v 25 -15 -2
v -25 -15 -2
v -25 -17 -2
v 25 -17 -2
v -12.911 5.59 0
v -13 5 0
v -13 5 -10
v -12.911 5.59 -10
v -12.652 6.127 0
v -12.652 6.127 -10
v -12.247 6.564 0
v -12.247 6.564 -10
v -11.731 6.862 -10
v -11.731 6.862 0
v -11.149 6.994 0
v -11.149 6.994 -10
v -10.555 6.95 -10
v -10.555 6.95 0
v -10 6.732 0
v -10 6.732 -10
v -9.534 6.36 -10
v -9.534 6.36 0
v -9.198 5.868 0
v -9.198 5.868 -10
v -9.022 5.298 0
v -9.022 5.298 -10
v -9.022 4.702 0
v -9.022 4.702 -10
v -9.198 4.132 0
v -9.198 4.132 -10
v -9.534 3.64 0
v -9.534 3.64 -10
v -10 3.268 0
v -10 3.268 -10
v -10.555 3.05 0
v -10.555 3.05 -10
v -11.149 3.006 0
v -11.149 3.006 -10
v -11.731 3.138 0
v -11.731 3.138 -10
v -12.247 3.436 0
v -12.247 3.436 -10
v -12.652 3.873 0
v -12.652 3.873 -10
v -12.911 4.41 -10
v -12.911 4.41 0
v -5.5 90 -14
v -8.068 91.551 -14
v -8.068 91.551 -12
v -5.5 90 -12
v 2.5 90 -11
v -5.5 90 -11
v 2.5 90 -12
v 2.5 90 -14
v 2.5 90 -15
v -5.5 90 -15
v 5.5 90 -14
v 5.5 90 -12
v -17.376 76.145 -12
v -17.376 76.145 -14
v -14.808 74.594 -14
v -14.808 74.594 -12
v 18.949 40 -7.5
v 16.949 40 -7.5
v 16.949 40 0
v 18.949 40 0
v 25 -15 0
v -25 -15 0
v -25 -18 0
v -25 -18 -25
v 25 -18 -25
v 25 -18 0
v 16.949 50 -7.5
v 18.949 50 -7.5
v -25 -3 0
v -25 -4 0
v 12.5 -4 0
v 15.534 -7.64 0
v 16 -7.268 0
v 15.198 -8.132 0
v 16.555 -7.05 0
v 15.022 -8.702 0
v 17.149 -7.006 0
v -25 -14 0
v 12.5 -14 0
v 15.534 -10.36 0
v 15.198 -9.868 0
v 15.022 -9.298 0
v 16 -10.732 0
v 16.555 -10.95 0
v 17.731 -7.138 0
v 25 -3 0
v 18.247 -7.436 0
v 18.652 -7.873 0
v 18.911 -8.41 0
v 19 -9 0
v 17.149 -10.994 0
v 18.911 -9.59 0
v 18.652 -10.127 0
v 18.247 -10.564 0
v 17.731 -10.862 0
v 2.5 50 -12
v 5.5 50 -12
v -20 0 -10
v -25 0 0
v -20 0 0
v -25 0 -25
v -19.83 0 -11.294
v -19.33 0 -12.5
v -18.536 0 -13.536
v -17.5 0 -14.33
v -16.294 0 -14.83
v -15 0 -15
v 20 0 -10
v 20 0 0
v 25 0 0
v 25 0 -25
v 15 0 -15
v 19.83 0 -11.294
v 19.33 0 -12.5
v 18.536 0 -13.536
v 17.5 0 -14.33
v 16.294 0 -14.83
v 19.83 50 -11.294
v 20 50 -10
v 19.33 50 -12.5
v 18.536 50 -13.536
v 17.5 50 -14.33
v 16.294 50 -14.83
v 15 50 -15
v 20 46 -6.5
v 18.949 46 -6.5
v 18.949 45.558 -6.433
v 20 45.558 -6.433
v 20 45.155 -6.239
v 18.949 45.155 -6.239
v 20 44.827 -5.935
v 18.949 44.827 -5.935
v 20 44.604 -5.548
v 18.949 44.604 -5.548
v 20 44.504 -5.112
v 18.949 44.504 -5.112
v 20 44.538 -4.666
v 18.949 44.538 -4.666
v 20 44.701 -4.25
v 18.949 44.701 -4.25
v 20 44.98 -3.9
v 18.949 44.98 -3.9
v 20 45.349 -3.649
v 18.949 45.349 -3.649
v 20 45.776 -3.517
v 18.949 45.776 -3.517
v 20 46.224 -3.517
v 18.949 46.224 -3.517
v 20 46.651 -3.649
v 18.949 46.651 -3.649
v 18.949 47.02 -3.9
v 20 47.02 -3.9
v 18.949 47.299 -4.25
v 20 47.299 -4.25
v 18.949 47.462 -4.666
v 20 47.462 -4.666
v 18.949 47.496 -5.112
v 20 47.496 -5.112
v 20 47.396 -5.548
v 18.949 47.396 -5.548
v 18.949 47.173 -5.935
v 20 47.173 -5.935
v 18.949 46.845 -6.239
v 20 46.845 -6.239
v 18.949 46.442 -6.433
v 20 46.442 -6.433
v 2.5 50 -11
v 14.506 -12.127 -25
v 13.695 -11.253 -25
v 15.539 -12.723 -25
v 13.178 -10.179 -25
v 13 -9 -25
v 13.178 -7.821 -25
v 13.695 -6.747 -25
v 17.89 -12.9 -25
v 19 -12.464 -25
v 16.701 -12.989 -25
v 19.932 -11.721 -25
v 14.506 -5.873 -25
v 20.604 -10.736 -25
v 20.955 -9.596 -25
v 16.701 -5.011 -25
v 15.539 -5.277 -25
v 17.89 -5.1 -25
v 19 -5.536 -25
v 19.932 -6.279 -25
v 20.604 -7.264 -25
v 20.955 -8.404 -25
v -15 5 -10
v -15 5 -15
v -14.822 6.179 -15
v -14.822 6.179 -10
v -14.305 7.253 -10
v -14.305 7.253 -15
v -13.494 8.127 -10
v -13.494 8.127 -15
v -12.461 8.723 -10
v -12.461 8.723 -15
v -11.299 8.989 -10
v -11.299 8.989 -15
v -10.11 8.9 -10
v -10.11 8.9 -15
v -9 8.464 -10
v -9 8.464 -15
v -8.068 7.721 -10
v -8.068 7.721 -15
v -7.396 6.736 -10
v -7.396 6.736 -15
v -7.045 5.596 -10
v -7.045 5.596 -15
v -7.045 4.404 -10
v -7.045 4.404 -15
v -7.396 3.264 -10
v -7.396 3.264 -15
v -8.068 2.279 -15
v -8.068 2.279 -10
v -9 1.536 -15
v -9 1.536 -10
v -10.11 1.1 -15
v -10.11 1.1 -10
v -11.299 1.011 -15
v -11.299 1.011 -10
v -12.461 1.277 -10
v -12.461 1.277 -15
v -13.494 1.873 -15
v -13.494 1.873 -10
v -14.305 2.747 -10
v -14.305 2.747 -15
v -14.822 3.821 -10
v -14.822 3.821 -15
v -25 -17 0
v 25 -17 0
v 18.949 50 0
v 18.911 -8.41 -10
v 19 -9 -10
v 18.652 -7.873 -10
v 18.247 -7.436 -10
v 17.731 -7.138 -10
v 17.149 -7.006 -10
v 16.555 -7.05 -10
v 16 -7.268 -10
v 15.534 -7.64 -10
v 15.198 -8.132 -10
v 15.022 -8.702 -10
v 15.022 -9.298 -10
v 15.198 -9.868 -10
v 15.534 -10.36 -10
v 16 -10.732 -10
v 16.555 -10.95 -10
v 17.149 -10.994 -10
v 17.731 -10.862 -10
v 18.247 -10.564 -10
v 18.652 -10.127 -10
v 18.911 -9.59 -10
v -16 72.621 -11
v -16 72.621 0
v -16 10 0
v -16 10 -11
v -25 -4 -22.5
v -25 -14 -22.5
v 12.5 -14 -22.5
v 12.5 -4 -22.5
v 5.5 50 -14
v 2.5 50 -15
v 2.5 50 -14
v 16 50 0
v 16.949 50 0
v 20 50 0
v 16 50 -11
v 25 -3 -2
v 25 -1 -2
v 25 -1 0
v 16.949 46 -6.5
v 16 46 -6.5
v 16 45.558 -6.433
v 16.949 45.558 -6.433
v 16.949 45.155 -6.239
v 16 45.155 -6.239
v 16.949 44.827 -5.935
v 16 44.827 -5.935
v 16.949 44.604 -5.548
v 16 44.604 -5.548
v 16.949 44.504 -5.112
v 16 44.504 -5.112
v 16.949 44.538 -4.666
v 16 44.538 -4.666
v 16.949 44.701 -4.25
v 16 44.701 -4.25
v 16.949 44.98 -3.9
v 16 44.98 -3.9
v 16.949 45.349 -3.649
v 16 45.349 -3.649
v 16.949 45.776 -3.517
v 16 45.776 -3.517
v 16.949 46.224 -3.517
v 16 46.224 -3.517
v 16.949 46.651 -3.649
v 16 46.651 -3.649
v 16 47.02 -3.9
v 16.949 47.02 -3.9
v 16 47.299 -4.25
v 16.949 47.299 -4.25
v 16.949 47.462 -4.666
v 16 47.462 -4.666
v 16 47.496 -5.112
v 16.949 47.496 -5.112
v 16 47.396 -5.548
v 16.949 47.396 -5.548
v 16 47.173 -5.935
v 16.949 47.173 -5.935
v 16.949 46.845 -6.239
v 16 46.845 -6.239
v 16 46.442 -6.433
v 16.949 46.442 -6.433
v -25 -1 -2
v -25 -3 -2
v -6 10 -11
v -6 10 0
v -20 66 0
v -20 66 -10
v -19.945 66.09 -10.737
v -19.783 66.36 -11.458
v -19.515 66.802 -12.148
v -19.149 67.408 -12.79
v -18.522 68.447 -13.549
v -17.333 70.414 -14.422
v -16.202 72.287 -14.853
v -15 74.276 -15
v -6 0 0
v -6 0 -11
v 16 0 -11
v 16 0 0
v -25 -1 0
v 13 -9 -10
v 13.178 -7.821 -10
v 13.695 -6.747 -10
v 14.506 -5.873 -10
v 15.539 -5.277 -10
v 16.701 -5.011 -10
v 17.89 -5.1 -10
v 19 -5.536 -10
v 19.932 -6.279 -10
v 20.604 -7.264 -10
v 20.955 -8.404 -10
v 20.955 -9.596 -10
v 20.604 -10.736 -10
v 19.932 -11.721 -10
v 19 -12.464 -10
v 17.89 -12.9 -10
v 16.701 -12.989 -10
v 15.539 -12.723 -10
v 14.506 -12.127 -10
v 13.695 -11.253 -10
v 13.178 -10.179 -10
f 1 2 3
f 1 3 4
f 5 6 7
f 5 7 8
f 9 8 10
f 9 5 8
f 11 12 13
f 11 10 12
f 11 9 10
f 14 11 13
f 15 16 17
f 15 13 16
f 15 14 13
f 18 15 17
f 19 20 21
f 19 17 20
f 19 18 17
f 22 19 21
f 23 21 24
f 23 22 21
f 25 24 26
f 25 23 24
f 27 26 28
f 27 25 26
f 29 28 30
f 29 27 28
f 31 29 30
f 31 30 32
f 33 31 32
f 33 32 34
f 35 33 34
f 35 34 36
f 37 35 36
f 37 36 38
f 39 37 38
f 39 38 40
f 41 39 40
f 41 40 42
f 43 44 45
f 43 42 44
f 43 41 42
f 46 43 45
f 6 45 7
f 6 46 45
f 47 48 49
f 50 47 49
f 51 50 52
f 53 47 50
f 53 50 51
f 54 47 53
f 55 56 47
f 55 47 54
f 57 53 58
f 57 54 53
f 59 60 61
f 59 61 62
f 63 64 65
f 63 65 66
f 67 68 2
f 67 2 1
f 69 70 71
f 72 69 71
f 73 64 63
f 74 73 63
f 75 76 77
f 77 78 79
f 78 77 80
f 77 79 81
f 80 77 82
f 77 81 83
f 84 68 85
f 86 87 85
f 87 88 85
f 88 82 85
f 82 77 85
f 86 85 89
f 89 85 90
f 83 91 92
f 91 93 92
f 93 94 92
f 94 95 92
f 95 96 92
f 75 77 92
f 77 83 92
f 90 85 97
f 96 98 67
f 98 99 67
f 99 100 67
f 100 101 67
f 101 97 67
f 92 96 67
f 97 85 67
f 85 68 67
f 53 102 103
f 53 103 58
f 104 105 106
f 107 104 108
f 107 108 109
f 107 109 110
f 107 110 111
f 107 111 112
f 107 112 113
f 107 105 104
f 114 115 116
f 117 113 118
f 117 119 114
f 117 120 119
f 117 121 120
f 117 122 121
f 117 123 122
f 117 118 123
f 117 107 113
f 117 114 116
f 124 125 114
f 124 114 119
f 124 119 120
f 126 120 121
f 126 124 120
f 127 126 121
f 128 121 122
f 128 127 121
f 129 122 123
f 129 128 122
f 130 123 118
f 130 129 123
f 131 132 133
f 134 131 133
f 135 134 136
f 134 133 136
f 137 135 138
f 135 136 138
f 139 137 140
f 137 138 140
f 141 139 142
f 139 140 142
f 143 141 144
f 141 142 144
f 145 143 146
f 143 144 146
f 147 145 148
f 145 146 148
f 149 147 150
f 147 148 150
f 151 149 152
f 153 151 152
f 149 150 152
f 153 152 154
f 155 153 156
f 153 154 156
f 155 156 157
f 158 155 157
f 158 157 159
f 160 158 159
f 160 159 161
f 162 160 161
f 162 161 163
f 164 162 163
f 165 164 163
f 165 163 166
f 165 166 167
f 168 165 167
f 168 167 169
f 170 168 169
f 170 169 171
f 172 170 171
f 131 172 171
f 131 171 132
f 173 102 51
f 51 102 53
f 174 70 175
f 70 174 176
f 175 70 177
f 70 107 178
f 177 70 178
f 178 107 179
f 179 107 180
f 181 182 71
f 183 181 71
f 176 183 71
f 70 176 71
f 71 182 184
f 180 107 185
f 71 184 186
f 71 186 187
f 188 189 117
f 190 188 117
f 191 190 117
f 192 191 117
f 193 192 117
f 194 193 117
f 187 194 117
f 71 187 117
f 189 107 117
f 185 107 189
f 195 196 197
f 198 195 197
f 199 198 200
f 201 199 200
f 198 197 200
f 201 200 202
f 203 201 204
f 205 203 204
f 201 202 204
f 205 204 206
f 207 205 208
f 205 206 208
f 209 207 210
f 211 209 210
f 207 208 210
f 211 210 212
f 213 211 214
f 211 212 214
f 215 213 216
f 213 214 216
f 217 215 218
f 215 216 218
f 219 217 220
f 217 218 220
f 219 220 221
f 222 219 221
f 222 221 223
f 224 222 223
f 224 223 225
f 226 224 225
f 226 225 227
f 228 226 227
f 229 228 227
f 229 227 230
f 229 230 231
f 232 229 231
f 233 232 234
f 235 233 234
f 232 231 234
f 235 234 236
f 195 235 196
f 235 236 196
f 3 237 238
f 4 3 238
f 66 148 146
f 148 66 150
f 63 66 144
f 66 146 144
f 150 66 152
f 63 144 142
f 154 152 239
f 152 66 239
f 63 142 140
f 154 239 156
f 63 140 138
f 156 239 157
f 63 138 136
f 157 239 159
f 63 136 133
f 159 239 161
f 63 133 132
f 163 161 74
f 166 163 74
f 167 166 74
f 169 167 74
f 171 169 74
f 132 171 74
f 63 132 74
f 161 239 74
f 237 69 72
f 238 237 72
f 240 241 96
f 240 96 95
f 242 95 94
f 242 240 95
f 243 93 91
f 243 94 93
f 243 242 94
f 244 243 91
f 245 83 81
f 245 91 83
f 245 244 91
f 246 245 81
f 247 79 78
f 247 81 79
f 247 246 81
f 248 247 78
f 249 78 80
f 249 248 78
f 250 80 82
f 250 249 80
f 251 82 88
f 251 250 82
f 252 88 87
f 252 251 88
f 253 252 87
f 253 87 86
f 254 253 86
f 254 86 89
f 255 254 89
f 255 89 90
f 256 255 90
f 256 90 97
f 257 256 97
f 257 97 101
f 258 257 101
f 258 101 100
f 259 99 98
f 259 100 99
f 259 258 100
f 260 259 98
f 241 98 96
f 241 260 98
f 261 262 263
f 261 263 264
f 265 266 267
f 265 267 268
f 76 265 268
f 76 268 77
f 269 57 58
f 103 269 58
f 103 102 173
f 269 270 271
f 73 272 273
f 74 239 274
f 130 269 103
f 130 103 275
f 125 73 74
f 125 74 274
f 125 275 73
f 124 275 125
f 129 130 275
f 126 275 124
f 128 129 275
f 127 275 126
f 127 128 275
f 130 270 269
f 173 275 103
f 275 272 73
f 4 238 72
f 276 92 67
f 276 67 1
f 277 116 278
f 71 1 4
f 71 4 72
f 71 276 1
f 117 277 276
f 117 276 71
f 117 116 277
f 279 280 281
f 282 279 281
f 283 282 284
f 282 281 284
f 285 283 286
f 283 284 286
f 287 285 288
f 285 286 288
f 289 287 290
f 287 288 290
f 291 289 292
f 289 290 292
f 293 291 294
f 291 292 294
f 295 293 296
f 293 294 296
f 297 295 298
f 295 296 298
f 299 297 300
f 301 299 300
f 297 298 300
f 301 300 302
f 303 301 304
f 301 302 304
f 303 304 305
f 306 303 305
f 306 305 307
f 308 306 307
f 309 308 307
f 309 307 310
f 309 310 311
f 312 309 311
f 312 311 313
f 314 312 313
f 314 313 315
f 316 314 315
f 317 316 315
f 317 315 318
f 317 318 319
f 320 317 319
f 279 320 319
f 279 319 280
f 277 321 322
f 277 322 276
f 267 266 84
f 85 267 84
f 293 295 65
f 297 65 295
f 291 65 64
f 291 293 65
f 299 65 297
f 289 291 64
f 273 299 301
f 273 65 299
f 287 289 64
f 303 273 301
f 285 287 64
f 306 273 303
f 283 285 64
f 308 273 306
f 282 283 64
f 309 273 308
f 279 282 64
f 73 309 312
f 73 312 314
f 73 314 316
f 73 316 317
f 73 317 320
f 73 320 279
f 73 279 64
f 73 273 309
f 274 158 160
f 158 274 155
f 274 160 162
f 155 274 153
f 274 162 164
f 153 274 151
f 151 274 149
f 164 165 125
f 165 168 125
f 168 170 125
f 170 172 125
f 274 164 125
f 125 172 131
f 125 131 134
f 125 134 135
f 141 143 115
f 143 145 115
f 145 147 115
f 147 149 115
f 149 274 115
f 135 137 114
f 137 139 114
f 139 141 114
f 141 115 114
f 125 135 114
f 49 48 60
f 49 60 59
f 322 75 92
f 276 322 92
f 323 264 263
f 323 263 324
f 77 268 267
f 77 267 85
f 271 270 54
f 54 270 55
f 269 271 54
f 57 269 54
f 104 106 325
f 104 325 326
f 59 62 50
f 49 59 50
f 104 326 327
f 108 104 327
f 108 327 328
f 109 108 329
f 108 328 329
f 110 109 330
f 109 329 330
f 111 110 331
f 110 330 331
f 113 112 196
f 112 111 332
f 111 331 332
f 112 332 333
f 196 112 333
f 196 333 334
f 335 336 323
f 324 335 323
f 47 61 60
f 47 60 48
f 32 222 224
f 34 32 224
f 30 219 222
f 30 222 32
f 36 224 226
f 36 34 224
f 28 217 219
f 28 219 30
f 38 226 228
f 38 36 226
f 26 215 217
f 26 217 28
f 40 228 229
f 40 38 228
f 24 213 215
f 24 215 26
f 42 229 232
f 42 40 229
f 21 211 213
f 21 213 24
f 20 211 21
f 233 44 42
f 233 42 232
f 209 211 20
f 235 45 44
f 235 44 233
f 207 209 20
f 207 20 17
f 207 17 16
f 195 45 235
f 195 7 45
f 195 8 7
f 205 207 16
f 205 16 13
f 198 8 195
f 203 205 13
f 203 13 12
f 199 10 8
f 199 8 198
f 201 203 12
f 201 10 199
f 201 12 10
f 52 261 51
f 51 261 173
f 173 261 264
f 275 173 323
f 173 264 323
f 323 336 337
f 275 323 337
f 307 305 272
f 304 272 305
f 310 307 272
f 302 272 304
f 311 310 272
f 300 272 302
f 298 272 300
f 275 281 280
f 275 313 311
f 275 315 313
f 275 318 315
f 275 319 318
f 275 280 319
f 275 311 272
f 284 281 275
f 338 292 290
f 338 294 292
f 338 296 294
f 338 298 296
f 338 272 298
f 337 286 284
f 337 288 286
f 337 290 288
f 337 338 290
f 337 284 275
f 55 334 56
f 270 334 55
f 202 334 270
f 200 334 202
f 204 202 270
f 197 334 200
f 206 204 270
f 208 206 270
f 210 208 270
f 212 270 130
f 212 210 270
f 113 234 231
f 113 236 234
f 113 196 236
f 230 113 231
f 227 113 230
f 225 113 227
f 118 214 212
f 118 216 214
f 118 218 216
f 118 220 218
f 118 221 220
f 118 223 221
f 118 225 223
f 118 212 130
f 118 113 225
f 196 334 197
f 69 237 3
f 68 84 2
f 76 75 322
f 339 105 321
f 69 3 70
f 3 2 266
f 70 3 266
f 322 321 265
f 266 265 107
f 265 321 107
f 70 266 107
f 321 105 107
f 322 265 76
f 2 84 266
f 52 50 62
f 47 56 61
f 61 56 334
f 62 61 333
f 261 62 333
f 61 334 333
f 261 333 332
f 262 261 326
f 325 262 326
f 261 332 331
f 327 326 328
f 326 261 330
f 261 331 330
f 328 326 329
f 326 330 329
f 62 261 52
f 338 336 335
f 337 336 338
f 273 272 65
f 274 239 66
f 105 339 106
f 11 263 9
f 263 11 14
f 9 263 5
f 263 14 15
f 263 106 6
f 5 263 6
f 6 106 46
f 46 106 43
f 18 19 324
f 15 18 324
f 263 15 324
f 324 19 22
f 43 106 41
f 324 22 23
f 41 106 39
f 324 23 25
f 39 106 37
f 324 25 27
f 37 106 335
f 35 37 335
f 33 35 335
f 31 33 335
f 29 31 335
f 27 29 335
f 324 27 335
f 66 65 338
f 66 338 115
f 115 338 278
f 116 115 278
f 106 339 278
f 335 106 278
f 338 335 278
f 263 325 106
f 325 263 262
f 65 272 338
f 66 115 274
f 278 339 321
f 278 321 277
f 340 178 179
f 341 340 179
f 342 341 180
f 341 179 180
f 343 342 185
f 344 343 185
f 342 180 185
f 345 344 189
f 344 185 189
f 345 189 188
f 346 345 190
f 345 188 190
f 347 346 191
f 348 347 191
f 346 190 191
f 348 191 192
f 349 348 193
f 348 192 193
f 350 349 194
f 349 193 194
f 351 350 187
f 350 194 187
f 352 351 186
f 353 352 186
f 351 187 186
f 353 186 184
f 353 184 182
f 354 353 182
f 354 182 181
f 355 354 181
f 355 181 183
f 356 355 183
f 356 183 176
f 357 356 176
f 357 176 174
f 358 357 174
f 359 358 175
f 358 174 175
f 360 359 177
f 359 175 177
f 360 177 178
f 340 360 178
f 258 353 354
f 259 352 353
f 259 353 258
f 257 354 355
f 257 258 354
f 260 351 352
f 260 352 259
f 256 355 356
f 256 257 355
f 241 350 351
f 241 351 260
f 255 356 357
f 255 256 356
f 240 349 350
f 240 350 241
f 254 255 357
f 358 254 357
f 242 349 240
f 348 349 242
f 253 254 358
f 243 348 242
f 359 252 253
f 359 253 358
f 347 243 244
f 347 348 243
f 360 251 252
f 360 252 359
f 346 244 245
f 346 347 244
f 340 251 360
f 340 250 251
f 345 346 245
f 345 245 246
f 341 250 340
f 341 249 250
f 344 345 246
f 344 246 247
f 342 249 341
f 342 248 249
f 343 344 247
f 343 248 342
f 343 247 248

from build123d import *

# Parameters (mm, degrees)
SKETCH1_W                = 40
SKETCH1_H                = 30
BOSS_EXTRUDE1_DEPTH      = 90
SHELL1_T                 = -4
FILLET1_R                = 5
CUT_EXTRUDE1_DEPTH       = 94.407708461
CUT_EXTRUDE1_DEPTH_BACK  = 94.407708461
CUT_EXTRUDE2_DEPTH       = 94.407708461
CUT_EXTRUDE2_DEPTH_BACK  = 94.407708461
SKETCH3_W                = 17.5
SKETCH3_H                = 40
SKETCH5_W                = 2
SKETCH5_H                = 40
BOSS_EXTRUDE2_DEPTH      = 3
SKETCH6_W                = 2
SKETCH6_H                = 18
BOSS_EXTRUDE3_DEPTH      = 3
SKETCH8_W                = 50
SKETCH8_H                = 50
BOSS_EXTRUDE4_DEPTH      = 18
SKETCH10_W               = 45
SKETCH10_H               = 10
CUT_EXTRUDE4_DEPTH       = 37.5
BOSS_EXTRUDE5_REACH      = 103.502
SKETCH15_W               = 10
SKETCH15_H               = 10
CUT_EXTRUDE8_DEPTH       = 103.988587343
CUT_EXTRUDE8_DEPTH_BACK  = 103.988587343
SKETCH20_R               = 2
SKETCH21_R               = 4
CUT_EXTRUDE9_DEPTH       = 5
SKETCH23_W               = 2
SKETCH23_H               = 15
CUT_EXTRUDE10_DEPTH      = 10
CUT_EXTRUDE11_START      = -10
SKETCH24_R               = 1.5
CUT_EXTRUDE11_DEPTH      = 116.031657717
CUT_EXTRUDE12_DEPTH      = 99.140965569
CUT_EXTRUDE12_DEPTH_BACK = 99.140965569
SKETCH27_W               = 50
SKETCH27_H               = 25
SKETCH29_W               = 50
SKETCH29_H               = 2
CUT_EXTRUDE13_DEPTH      = 2
SKETCH30_W               = 50
SKETCH30_H               = 2
CUT_EXTRUDE14_DEPTH      = 2
CUT_EXTRUDE15_DEPTH      = 99.140965569
CUT_EXTRUDE15_DEPTH_BACK = 99.140965569
SKETCH31_R               = 2
SKETCH33_R               = 4
CUT_EXTRUDE16_DEPTH      = 15


with BuildPart() as part:
    # Sketch1 → Boss-Extrude1 (new body)
    with BuildSketch(Plane(origin=(0, 0, 0), x_dir=(1, 0, 0), z_dir=(0, 1, 0))):
        Rectangle(SKETCH1_W, SKETCH1_H)
    extrude(amount=BOSS_EXTRUDE1_DEPTH)

    # Shell1
    shell1_openings = [part.faces().sort_by_distance(p)[0] for p in [
        (0, 90, 0),
        (0, 0, 0),
    ]]
    offset(amount=SHELL1_T, openings=shell1_openings, kind=Kind.INTERSECTION)

    # Fillet1
    fillet1_edges = [part.edges().sort_by_distance(p)[0] for p in [
        (20, 45, 15),
        (-20, 45, 15),
        (-20, 45, -15),
        (20, 45, -15),
    ]]
    fillet(fillet1_edges, radius=FILLET1_R)

    # Sketch2 → Cut-Extrude1 (cut, two sides: drawn at the far end of the back side and taken through both)
    with BuildSketch(Plane.XY.offset(-CUT_EXTRUDE1_DEPTH_BACK)):
        Polygon((-5.5, 90), (-20, 66), (-20, 90), align=None)
    extrude(amount=CUT_EXTRUDE1_DEPTH + CUT_EXTRUDE1_DEPTH_BACK, mode=Mode.SUBTRACT)

    # Sketch3 → Cut-Extrude2 (cut, two sides: drawn at the far end of the back side and taken through both)
    with BuildSketch(Plane.XY.offset(-CUT_EXTRUDE2_DEPTH_BACK)):
        with Locations((11.25, 70)):
            Rectangle(SKETCH3_W, SKETCH3_H)
    extrude(amount=CUT_EXTRUDE2_DEPTH + CUT_EXTRUDE2_DEPTH_BACK, mode=Mode.SUBTRACT)

    # Sketch5 → Boss-Extrude2 (add)
    with BuildSketch(Plane(origin=(2.5, 0, 0), x_dir=(0, 0, -1), z_dir=(1, 0, 0))):
        with Locations((-13, 70)):
            Rectangle(SKETCH5_W, SKETCH5_H)
    boss_extrude2 = extrude(amount=BOSS_EXTRUDE2_DEPTH)

    # Mirror1: Boss-Extrude2 across plane
    add(boss_extrude2.mirror(Plane.XY))

    # Sketch6 → Boss-Extrude3 (add)
    with BuildSketch(Plane(origin=(-43.86391097, 26.501112878, 0), x_dir=(0, 0, 1), z_dir=(-0.8559155419457906, 0.5171156399255814, 0))):
        with Locations((-13, 65.188262756)):
            Rectangle(SKETCH6_W, SKETCH6_H)
    boss_extrude3 = extrude(amount=BOSS_EXTRUDE3_DEPTH)

    # Mirror2: Boss-Extrude3 across plane
    add(boss_extrude3.mirror(Plane.XY))

    # Sketch8 → Boss-Extrude4 (add)
    with BuildSketch(Plane(origin=(0, 0, 0), x_dir=(1, 0, 0), z_dir=(0, 1, 0))):
        Rectangle(SKETCH8_W, SKETCH8_H)
    extrude(amount=-BOSS_EXTRUDE4_DEPTH)

    # Sketch10 → Cut-Extrude4 (cut)
    with BuildSketch(Plane.ZY.offset(25)):
        with Locations((0, -9)):
            Rectangle(SKETCH10_W, SKETCH10_H)
    extrude(amount=-CUT_EXTRUDE4_DEPTH, mode=Mode.SUBTRACT)

    # Sketch15 → Boss-Extrude5 (add, up to next)
    with BuildSketch(Plane.XY.offset(-11), mode=Mode.PRIVATE) as boss_extrude5_sk1:
        with Locations((-11, 5)):
            Rectangle(SKETCH15_W, SKETCH15_H)
    boss_extrude5_tool1 = extrude(boss_extrude5_sk1.sketch, amount=BOSS_EXTRUDE5_REACH, mode=Mode.PRIVATE) - part.part
    add(boss_extrude5_tool1.solids().sort_by_distance((-11, 5, -11))[0])

    # Sketch20 → Cut-Extrude8 (cut, two sides: drawn at the far end of the back side and taken through both)
    with BuildSketch(Plane(origin=(0, 0, -15), x_dir=(-1, 0, 0), z_dir=(0, 0, -1)).offset(-CUT_EXTRUDE8_DEPTH_BACK)):
        with Locations((11, 5)):
            Circle(SKETCH20_R)
    extrude(amount=CUT_EXTRUDE8_DEPTH + CUT_EXTRUDE8_DEPTH_BACK, mode=Mode.SUBTRACT)

    # Sketch21 → Cut-Extrude9 (cut)
    with BuildSketch(Plane(origin=(0, 0, -15), x_dir=(-1, 0, 0), z_dir=(0, 0, -1))):
        with Locations((11, 5)):
            Circle(SKETCH21_R)
    cut_extrude9 = extrude(amount=-CUT_EXTRUDE9_DEPTH, mode=Mode.SUBTRACT)

    # Mirror3: Cut-Extrude9 across plane
    add(cut_extrude9.mirror(Plane.XY), mode=Mode.SUBTRACT)

    # Sketch23 → Cut-Extrude10 (cut)
    with BuildSketch(Plane(origin=(0, 50, 0), x_dir=(1, 0, 0), z_dir=(0, 1, 0))):
        with Locations((17.949489743, 0)):
            Rectangle(SKETCH23_W, SKETCH23_H)
    extrude(amount=-CUT_EXTRUDE10_DEPTH, mode=Mode.SUBTRACT)

    # Sketch24 → Cut-Extrude11 (cut)
    with BuildSketch(Plane(origin=(20, 0, 0), x_dir=(0, 0, -1), z_dir=(1, 0, 0)).offset(CUT_EXTRUDE11_START)):
        with Locations(Location((-5, 46, 0), (0, 0, 180))):
            Circle(SKETCH24_R)
    cut_extrude11 = extrude(amount=CUT_EXTRUDE11_DEPTH, mode=Mode.SUBTRACT)

    # Mirror4: Cut-Extrude11 across plane
    add(cut_extrude11.mirror(Plane.XY), mode=Mode.SUBTRACT)

    # Sketch27 → Cut-Extrude12 (cut, two sides: drawn at the far end of the back side and taken through both)
    with BuildSketch(Plane(origin=(0, 0, 0), x_dir=(1, 0, 0), z_dir=(0, 1, 0)).offset(-CUT_EXTRUDE12_DEPTH_BACK)):
        with Locations((0, -12.5)):
            Rectangle(SKETCH27_W, SKETCH27_H)
    extrude(amount=CUT_EXTRUDE12_DEPTH + CUT_EXTRUDE12_DEPTH_BACK, mode=Mode.SUBTRACT)

    # Sketch29 → Cut-Extrude13 (cut)
    with BuildSketch(Plane.XY):
        with Locations((0, -2)):
            Rectangle(SKETCH29_W, SKETCH29_H)
    extrude(amount=-CUT_EXTRUDE13_DEPTH, mode=Mode.SUBTRACT)

    # Sketch30 → Cut-Extrude14 (cut)
    with BuildSketch(Plane.XY):
        with Locations((0, -16)):
            Rectangle(SKETCH30_W, SKETCH30_H)
    extrude(amount=-CUT_EXTRUDE14_DEPTH, mode=Mode.SUBTRACT)

    # Sketch31 → Cut-Extrude15 (cut, two sides: drawn at the far end of the back side and taken through both)
    with BuildSketch(Plane.XY.offset(-CUT_EXTRUDE15_DEPTH_BACK)):
        with Locations((17, -9)):
            Circle(SKETCH31_R)
    extrude(amount=CUT_EXTRUDE15_DEPTH + CUT_EXTRUDE15_DEPTH_BACK, mode=Mode.SUBTRACT)

    # Sketch33 → Cut-Extrude16 (cut)
    with BuildSketch(Plane(origin=(0, 0, -25), x_dir=(-1, 0, 0), z_dir=(0, 0, -1))):
        with Locations((-17, -9)):
            Circle(SKETCH33_R)
    extrude(amount=-CUT_EXTRUDE16_DEPTH, mode=Mode.SUBTRACT)


solid = part.part
